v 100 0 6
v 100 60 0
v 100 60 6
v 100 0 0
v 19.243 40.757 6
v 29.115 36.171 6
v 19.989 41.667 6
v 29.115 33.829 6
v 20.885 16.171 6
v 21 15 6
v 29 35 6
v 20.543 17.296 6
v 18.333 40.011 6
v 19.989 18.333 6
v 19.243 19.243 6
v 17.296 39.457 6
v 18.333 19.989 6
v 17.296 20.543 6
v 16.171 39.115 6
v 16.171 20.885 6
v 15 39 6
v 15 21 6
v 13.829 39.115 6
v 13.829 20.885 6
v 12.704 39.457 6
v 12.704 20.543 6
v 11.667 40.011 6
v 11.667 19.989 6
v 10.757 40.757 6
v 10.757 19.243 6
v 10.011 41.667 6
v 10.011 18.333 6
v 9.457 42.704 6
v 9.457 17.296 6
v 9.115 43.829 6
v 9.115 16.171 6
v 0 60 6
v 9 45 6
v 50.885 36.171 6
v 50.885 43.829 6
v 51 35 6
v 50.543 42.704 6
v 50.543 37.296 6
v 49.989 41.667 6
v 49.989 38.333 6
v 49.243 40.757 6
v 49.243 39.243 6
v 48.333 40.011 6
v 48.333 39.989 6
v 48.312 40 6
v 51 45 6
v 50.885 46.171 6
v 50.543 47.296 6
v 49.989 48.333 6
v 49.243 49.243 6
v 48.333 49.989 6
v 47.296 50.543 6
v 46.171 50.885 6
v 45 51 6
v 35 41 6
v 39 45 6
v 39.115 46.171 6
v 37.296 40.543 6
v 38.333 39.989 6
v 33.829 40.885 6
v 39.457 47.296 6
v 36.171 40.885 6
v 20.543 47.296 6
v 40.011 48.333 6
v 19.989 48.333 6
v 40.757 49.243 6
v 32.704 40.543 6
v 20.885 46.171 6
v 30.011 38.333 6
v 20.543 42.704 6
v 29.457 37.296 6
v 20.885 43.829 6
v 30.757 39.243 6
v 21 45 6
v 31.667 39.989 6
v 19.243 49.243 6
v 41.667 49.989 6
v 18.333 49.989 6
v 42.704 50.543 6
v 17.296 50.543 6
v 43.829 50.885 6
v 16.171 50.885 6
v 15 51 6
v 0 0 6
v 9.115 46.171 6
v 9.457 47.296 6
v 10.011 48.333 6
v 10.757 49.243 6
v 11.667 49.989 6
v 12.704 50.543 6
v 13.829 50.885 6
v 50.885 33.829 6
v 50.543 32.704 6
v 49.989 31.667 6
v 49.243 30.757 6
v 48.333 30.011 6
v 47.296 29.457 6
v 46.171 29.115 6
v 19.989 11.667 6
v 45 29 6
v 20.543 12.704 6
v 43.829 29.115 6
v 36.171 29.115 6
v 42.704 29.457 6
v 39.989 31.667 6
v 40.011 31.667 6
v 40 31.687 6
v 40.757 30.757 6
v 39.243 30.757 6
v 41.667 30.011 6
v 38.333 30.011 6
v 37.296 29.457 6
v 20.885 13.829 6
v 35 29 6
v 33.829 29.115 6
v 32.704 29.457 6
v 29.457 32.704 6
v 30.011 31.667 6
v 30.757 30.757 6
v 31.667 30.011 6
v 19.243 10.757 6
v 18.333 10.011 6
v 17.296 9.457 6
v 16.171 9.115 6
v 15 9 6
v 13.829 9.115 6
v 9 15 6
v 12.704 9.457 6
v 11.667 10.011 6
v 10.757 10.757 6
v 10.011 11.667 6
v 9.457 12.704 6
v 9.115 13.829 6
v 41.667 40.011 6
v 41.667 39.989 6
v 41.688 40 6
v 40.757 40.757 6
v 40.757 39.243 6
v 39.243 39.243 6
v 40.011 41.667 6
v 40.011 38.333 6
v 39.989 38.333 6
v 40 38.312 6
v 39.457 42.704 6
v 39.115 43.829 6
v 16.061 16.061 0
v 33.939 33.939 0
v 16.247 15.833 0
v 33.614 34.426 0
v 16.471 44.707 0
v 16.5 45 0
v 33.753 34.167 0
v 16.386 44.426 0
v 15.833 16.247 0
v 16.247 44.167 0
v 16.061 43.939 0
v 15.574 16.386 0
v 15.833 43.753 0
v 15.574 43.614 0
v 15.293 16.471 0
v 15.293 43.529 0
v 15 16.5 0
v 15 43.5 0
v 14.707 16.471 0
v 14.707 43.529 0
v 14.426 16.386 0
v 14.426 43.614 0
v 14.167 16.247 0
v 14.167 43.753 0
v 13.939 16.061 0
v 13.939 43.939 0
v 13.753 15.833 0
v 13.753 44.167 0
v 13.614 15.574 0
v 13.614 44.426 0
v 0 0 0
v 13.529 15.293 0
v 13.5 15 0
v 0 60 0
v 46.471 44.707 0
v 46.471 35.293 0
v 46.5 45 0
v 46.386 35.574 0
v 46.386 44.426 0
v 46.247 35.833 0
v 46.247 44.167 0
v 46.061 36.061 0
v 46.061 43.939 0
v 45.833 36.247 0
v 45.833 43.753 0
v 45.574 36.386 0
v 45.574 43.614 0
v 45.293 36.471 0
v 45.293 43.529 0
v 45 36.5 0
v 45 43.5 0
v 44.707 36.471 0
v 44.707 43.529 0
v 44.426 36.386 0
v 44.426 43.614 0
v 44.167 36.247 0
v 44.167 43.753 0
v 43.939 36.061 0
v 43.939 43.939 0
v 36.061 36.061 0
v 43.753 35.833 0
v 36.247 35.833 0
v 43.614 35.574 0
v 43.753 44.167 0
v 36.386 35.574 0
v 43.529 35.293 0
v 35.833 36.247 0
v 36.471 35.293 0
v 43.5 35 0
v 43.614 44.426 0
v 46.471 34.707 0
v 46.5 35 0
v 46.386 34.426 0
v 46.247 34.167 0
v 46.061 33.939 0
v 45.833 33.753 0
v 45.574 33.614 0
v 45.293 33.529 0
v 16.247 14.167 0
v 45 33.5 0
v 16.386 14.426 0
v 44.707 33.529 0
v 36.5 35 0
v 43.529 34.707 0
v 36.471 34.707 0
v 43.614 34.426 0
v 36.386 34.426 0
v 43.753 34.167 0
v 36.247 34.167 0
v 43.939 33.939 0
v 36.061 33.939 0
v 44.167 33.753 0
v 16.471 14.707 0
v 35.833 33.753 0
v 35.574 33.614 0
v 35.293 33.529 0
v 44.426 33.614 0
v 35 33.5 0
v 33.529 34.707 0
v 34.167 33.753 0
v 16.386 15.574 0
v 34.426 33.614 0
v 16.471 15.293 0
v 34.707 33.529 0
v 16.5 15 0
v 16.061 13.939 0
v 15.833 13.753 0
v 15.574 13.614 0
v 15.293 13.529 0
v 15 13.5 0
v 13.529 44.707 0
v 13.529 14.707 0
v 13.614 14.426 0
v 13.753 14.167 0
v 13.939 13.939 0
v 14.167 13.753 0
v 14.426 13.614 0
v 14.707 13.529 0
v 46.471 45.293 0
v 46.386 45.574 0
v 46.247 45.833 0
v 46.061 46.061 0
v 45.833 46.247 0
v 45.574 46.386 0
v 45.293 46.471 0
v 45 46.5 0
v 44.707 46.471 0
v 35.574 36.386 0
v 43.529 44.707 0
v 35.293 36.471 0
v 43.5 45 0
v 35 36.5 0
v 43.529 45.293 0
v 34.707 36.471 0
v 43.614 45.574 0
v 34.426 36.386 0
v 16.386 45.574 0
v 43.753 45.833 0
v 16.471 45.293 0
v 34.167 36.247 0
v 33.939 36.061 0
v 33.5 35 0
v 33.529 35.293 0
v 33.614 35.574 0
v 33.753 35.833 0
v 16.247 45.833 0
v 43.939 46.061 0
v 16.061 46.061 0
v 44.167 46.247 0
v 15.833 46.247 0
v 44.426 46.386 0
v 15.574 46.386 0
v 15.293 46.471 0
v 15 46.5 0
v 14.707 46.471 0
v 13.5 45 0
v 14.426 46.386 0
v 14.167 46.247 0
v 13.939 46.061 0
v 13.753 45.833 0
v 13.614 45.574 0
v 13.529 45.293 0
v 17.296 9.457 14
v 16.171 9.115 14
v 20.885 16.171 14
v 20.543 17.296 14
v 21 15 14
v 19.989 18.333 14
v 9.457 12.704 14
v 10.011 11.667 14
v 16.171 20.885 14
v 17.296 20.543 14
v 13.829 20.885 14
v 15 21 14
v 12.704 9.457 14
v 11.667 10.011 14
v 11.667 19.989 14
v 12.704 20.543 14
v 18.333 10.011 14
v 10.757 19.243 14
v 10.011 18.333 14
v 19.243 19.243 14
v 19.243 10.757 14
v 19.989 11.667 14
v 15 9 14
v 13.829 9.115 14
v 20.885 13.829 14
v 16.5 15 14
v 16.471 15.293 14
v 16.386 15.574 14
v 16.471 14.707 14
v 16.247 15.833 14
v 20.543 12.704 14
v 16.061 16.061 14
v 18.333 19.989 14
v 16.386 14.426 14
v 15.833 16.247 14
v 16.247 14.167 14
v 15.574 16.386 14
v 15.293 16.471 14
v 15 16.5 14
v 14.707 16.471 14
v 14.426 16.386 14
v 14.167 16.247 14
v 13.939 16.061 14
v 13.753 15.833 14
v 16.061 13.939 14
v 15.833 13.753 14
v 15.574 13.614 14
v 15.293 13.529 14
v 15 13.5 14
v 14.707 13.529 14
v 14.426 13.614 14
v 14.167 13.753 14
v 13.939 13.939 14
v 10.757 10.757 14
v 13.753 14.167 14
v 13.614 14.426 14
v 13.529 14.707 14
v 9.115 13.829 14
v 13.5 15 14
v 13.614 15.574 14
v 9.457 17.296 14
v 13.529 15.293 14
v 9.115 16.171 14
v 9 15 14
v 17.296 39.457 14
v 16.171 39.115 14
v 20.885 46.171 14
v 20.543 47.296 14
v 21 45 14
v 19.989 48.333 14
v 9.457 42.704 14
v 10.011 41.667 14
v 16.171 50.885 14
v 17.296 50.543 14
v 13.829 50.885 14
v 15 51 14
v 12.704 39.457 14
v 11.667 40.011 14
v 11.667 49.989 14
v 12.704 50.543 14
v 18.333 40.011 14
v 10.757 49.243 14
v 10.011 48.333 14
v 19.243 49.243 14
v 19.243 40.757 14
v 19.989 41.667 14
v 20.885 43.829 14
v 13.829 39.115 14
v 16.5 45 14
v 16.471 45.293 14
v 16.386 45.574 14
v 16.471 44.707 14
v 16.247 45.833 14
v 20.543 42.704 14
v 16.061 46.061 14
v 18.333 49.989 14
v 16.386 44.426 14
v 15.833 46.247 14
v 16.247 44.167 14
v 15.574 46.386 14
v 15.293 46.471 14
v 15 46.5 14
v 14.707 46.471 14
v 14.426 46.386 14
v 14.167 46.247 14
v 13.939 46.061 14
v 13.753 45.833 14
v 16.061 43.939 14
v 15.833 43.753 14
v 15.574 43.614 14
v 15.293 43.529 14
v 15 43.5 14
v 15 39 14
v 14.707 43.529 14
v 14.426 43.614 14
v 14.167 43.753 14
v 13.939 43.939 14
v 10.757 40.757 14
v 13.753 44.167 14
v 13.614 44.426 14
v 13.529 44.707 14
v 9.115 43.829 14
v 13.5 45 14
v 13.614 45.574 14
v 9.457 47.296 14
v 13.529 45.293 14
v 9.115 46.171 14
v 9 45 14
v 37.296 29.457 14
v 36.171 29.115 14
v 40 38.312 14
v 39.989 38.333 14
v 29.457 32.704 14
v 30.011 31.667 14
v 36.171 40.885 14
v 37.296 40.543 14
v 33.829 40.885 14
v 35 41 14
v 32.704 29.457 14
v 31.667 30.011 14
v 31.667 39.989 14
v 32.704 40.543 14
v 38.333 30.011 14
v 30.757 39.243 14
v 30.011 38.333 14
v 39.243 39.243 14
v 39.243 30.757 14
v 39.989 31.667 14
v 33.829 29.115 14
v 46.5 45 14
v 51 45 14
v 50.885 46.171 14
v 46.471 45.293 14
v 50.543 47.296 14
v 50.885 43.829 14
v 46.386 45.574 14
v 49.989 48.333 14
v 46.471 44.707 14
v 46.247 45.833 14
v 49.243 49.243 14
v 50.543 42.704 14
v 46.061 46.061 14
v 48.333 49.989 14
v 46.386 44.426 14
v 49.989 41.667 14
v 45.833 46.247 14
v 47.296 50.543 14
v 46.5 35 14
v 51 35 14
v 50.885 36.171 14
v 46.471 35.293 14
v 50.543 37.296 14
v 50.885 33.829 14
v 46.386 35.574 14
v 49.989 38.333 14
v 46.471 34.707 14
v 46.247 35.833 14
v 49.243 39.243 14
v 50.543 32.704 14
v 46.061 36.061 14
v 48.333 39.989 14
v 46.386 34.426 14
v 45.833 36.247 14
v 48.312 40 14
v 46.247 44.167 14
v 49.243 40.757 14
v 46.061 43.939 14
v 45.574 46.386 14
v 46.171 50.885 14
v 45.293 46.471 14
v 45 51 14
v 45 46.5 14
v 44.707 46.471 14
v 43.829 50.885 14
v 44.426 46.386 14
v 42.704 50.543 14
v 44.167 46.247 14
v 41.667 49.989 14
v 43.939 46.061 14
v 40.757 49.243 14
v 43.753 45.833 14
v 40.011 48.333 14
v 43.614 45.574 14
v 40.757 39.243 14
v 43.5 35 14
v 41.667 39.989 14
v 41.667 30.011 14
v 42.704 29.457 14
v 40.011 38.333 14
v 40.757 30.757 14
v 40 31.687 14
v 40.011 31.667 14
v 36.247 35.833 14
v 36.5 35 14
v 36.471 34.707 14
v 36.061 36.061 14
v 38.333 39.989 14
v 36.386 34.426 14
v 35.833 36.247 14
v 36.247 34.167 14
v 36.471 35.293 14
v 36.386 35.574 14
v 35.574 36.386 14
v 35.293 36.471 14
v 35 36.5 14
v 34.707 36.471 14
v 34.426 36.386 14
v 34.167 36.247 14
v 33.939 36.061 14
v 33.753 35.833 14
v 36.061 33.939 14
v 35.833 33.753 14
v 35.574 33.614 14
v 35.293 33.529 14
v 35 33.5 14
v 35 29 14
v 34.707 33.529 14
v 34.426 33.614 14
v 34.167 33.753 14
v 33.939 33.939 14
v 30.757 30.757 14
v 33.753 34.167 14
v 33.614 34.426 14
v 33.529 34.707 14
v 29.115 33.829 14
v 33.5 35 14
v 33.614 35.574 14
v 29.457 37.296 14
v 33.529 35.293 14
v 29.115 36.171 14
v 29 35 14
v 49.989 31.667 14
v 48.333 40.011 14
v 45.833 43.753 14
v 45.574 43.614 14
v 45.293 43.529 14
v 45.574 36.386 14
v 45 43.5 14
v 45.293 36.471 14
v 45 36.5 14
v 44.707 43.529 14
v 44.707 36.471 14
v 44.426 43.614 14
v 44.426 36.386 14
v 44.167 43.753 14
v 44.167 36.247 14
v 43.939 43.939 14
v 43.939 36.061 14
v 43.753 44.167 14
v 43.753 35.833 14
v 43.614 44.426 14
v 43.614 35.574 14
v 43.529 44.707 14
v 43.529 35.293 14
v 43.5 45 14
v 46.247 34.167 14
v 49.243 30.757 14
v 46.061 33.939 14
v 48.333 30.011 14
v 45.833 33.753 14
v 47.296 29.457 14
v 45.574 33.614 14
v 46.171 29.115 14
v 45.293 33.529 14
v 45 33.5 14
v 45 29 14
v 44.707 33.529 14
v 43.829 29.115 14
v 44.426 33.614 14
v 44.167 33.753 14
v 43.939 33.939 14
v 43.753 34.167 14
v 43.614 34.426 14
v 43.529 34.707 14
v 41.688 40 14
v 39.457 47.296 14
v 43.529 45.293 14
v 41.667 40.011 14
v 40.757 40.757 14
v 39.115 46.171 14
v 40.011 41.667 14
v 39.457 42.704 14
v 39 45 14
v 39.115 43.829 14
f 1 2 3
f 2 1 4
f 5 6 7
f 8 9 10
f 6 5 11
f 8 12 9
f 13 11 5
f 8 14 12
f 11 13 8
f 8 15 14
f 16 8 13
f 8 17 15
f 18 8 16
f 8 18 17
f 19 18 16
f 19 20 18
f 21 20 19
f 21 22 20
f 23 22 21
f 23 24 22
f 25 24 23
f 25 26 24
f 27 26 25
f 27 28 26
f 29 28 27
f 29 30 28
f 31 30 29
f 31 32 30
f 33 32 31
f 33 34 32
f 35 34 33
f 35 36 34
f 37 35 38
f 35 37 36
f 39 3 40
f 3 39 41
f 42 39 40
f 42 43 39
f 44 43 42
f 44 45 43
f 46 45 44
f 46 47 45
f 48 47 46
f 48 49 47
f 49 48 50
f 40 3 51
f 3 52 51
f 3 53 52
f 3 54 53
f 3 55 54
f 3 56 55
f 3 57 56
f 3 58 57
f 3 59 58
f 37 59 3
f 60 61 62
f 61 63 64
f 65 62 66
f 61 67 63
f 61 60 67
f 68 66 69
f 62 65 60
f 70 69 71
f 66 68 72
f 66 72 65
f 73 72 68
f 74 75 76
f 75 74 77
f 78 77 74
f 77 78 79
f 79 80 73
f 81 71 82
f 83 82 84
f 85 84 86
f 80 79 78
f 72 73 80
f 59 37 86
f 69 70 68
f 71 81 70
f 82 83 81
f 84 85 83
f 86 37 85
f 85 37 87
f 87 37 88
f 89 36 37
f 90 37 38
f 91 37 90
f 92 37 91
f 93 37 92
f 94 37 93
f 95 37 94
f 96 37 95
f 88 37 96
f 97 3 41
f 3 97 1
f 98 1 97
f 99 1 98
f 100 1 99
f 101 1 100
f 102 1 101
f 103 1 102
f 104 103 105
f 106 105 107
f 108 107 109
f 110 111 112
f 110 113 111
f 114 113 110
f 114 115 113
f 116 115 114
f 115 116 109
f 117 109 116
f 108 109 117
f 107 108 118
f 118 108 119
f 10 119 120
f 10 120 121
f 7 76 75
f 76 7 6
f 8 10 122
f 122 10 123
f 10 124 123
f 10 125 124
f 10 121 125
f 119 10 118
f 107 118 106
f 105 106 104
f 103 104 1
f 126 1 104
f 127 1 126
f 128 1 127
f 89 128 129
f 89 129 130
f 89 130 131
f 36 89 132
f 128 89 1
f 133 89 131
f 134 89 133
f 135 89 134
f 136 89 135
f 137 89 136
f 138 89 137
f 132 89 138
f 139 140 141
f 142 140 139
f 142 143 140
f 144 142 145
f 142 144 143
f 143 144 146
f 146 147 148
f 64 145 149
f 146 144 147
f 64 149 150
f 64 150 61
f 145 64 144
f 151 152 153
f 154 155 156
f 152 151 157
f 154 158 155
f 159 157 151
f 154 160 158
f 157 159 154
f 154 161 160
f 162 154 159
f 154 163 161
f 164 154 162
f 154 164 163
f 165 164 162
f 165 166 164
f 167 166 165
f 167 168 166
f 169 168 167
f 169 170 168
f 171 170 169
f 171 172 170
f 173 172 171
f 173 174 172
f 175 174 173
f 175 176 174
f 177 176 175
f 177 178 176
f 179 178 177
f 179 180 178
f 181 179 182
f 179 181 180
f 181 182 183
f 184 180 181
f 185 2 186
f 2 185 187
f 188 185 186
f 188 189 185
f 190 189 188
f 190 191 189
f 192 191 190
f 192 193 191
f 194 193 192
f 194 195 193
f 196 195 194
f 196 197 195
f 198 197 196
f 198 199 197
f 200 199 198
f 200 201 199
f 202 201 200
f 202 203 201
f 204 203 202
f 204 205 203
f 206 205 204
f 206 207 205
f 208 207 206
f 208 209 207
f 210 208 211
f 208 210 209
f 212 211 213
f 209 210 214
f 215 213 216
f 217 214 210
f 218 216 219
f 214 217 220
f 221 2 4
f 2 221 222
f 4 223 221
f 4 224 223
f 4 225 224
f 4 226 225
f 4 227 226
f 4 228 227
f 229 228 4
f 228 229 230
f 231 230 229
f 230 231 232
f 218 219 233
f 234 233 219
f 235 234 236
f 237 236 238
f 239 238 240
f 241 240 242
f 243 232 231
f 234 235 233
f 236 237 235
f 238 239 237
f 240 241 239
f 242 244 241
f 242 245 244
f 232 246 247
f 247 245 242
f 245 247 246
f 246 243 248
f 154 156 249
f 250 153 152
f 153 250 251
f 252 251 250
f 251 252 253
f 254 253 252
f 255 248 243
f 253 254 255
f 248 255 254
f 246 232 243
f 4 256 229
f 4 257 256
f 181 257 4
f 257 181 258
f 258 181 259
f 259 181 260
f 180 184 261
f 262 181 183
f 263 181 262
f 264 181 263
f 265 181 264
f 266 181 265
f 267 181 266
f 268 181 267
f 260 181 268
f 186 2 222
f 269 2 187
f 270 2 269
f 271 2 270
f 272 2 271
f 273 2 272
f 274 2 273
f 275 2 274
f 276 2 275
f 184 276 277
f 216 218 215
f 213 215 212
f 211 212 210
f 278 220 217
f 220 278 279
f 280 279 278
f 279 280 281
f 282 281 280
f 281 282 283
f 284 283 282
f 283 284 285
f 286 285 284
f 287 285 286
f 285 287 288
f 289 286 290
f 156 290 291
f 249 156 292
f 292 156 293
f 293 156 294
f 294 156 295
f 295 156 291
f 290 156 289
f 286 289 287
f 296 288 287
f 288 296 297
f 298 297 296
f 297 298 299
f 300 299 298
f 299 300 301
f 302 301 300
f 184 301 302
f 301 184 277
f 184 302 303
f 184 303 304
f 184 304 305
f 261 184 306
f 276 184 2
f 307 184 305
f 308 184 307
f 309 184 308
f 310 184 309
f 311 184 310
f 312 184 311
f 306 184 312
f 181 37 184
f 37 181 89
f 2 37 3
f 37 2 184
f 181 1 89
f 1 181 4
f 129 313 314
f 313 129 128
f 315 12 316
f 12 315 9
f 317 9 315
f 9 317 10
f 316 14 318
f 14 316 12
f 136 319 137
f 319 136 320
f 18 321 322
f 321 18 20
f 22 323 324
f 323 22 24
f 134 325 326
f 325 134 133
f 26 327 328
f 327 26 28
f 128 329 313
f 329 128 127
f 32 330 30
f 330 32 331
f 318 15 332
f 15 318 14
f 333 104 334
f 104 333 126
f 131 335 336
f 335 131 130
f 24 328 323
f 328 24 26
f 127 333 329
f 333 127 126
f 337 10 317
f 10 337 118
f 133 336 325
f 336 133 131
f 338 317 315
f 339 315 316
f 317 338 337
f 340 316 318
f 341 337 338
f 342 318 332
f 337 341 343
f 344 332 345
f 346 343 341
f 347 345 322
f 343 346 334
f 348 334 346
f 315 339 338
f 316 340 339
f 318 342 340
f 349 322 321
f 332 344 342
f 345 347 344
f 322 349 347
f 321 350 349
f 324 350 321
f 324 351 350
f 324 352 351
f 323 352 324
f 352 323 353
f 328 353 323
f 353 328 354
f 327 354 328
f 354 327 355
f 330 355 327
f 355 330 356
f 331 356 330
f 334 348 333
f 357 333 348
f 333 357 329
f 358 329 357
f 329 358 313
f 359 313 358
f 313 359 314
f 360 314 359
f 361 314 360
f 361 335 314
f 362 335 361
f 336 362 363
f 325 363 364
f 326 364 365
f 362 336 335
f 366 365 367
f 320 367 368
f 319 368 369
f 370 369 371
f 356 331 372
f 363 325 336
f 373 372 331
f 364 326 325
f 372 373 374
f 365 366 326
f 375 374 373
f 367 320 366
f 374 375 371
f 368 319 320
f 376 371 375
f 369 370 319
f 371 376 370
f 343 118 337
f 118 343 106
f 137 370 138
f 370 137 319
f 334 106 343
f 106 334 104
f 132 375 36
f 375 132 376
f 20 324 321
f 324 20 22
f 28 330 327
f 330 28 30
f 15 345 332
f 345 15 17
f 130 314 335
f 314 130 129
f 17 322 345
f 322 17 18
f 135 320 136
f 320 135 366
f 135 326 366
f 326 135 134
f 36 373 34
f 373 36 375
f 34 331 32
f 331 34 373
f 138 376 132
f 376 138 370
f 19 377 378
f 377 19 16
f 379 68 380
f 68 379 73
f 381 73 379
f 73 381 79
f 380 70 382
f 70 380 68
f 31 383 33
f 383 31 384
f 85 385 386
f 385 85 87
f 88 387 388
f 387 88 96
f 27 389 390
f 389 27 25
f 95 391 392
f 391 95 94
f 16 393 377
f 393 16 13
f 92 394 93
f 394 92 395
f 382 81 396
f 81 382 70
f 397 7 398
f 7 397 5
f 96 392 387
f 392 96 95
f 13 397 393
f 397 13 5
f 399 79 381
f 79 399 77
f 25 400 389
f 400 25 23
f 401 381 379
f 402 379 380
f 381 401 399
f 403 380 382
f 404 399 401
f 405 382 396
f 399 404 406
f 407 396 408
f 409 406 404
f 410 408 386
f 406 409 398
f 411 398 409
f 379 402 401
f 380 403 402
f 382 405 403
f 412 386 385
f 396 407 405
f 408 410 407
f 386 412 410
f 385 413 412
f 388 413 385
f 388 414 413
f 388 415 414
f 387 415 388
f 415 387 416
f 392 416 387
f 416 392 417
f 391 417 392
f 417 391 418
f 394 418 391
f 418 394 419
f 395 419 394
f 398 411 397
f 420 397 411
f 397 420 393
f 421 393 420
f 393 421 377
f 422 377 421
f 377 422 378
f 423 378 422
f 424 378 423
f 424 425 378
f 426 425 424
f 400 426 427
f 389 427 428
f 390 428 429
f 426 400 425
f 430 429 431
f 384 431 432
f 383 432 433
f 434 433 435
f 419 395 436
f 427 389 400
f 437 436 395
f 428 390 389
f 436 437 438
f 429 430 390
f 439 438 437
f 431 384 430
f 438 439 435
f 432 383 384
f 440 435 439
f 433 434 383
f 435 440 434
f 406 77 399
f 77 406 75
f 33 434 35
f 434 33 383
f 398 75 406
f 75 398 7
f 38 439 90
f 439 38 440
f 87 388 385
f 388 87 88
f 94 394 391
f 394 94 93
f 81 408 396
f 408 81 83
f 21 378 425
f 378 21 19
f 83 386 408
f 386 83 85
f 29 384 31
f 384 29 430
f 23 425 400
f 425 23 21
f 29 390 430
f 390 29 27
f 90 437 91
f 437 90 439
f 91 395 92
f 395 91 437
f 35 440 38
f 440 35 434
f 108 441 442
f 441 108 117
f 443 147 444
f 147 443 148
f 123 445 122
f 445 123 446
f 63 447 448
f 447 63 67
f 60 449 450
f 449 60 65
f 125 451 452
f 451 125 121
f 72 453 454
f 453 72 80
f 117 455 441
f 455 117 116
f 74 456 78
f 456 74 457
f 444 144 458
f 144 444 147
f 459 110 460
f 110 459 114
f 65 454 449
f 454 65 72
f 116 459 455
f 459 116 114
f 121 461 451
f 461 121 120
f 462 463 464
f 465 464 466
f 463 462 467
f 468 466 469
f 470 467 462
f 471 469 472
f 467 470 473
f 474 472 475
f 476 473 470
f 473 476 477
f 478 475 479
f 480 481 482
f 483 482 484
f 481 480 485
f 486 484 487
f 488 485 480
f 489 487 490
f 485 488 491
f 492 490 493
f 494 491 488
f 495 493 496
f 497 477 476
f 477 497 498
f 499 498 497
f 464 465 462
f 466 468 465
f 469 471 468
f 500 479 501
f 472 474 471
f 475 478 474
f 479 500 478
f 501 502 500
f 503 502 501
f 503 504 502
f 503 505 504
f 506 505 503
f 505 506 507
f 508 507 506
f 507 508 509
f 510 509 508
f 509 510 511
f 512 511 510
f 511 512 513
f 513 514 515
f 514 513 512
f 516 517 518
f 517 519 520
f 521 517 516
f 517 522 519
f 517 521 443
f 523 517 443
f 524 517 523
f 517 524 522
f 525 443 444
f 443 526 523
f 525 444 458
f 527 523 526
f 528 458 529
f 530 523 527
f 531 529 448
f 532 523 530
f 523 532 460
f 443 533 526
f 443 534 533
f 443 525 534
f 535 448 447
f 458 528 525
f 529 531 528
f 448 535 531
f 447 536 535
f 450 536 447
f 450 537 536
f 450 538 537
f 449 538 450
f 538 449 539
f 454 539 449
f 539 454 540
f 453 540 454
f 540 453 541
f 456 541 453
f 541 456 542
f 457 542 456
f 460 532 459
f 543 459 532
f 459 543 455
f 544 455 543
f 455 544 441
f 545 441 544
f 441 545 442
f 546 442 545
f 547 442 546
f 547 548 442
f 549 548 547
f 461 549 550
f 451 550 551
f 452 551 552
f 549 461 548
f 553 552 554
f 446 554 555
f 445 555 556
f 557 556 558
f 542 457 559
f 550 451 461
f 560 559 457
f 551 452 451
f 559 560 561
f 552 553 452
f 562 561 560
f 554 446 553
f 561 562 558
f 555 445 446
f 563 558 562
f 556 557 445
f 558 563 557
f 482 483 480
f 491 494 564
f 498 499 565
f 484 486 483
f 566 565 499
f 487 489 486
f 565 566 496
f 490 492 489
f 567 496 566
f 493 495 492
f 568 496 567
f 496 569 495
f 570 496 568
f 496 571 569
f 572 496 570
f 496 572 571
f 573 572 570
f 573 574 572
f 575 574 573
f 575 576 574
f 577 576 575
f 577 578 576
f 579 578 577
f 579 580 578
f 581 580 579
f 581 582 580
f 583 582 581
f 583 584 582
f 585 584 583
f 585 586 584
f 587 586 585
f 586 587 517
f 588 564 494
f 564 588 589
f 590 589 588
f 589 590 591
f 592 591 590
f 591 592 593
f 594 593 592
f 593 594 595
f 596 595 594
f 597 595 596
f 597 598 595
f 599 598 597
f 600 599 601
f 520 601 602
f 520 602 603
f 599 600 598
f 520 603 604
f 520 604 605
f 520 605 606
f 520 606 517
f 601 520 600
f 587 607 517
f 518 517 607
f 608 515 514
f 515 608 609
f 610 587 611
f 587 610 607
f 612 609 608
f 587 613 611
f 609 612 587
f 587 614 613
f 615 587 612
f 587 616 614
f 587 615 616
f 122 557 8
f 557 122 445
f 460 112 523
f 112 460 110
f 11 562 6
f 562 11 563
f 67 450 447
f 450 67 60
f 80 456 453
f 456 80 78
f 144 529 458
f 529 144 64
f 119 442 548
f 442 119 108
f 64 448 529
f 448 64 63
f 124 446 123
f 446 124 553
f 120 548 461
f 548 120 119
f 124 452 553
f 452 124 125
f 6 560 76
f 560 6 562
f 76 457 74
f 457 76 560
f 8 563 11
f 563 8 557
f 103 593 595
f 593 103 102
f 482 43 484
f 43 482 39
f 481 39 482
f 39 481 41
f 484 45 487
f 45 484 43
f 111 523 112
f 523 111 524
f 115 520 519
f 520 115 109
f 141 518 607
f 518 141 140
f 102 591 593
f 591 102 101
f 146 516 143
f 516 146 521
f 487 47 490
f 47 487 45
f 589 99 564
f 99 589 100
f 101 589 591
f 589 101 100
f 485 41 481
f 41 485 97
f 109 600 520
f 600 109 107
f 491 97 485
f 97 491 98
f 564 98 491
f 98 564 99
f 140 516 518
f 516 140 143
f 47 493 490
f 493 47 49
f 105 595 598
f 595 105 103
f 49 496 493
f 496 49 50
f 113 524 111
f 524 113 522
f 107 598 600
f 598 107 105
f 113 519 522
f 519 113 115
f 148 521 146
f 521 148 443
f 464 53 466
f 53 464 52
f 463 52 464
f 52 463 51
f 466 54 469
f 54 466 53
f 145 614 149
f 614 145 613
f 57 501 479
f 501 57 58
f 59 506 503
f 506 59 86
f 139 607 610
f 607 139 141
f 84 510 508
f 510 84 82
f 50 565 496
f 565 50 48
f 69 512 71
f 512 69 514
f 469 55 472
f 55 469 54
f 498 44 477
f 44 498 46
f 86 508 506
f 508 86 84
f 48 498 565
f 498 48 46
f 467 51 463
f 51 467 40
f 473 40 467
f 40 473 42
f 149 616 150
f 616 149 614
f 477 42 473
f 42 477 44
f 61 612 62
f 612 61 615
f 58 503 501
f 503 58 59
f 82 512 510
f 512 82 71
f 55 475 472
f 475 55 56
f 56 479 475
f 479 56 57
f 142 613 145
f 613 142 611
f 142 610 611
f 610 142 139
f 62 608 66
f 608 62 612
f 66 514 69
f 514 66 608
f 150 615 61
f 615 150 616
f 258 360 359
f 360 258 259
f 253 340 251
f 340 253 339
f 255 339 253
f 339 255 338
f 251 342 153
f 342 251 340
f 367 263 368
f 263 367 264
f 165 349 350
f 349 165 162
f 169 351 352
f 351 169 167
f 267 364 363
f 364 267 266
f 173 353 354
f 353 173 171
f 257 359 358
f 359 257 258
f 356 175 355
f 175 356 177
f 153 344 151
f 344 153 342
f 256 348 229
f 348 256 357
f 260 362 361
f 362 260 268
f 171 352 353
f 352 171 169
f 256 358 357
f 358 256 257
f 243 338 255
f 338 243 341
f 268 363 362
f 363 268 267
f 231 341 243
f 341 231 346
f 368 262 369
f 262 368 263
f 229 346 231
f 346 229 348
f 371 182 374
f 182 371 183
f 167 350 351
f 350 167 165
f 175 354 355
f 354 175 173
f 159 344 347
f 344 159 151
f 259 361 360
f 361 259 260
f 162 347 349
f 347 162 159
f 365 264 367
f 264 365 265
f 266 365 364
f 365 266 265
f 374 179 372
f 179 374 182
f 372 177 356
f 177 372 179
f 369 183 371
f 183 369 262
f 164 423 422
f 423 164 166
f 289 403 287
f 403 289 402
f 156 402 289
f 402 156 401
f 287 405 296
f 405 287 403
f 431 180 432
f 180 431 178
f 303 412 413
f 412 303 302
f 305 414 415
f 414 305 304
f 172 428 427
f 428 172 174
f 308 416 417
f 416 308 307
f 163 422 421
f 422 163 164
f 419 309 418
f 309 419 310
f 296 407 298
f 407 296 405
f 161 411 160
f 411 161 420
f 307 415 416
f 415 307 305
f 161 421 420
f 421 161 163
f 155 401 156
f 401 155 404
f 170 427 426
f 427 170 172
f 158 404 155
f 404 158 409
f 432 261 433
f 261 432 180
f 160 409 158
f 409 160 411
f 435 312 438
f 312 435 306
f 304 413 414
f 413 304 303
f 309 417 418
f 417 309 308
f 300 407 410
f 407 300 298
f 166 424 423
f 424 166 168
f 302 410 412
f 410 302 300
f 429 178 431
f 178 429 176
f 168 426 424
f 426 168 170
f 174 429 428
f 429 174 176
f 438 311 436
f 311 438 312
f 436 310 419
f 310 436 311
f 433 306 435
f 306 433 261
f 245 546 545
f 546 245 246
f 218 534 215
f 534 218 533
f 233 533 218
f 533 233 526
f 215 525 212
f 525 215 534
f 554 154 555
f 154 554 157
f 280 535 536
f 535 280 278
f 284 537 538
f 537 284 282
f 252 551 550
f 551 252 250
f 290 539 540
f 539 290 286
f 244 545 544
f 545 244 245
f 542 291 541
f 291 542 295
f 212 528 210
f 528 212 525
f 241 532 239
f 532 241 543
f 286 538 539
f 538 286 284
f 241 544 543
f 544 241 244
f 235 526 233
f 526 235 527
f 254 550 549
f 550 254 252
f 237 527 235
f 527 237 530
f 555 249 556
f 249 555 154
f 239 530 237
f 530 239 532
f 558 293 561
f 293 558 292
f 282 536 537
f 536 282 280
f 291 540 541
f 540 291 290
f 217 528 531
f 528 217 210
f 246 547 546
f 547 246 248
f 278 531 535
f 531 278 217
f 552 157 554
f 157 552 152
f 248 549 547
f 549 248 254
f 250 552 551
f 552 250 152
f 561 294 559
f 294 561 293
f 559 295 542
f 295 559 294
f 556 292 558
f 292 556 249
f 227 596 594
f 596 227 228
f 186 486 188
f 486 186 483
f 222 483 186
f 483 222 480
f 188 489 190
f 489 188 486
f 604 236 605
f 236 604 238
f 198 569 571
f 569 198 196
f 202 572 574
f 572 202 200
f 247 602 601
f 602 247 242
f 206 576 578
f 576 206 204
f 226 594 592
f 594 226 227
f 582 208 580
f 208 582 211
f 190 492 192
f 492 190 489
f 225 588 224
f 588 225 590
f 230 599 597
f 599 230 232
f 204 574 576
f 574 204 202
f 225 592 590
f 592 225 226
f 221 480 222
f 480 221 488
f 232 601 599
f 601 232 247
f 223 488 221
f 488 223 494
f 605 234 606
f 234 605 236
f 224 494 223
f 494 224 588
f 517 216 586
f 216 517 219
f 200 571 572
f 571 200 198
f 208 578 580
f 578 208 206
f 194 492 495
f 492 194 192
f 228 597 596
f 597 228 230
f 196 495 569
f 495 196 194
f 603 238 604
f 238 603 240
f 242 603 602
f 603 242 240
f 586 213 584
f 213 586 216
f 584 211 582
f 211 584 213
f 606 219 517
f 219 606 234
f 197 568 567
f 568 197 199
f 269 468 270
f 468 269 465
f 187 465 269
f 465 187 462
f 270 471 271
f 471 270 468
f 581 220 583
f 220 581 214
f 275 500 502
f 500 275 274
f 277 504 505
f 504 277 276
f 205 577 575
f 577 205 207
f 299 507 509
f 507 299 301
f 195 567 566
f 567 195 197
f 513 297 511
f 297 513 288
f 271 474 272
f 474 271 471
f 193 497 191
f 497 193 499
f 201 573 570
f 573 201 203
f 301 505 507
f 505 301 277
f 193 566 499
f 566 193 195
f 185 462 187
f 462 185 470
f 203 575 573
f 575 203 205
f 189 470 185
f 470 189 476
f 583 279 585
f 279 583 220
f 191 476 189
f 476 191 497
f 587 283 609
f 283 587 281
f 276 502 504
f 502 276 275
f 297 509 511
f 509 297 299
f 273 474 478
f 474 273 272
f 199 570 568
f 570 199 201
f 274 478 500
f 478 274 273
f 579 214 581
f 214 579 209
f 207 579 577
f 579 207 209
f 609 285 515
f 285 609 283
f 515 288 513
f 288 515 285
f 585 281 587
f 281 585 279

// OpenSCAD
$fn = 32;

// ----------------------------------------------------------------------
// Boss field: plate with bosses at given coordinates
// ----------------------------------------------------------------------

// --- parameters (mm) ---
plate_l = 100;            // plate length, X
plate_w = 60;             // plate width, Y
plate_t = 6;              // plate thickness, Z
boss_d = 12;              // boss diameter
boss_h = 8;               // boss height above the plate
bore_d = 3;               // boss bore
fit_tol = 0.1;            // tolerance for press fits, mm
free_tol = 0.3;           // tolerance for clearance fits, mm

total_h = plate_t + boss_h;  // overall height

difference() {
  union() {
    cube([plate_l, plate_w, plate_t]);
    translate([15, 15, plate_t]) cylinder(h = boss_h, d = boss_d);
    translate([15, 45, plate_t]) cylinder(h = boss_h, d = boss_d);
    translate([35, 35, plate_t]) cylinder(h = boss_h, d = boss_d);
    translate([45, 35, plate_t]) cylinder(h = boss_h, d = boss_d);
    translate([45, 45, plate_t]) cylinder(h = boss_h, d = boss_d);
  }
  translate([15, 15, -1]) cylinder(h = total_h + 2, d = bore_d);
  translate([15, 45, -1]) cylinder(h = total_h + 2, d = bore_d);
  translate([35, 35, -1]) cylinder(h = total_h + 2, d = bore_d);
  translate([45, 35, -1]) cylinder(h = total_h + 2, d = bore_d);
  translate([45, 45, -1]) cylinder(h = total_h + 2, d = bore_d);
}
